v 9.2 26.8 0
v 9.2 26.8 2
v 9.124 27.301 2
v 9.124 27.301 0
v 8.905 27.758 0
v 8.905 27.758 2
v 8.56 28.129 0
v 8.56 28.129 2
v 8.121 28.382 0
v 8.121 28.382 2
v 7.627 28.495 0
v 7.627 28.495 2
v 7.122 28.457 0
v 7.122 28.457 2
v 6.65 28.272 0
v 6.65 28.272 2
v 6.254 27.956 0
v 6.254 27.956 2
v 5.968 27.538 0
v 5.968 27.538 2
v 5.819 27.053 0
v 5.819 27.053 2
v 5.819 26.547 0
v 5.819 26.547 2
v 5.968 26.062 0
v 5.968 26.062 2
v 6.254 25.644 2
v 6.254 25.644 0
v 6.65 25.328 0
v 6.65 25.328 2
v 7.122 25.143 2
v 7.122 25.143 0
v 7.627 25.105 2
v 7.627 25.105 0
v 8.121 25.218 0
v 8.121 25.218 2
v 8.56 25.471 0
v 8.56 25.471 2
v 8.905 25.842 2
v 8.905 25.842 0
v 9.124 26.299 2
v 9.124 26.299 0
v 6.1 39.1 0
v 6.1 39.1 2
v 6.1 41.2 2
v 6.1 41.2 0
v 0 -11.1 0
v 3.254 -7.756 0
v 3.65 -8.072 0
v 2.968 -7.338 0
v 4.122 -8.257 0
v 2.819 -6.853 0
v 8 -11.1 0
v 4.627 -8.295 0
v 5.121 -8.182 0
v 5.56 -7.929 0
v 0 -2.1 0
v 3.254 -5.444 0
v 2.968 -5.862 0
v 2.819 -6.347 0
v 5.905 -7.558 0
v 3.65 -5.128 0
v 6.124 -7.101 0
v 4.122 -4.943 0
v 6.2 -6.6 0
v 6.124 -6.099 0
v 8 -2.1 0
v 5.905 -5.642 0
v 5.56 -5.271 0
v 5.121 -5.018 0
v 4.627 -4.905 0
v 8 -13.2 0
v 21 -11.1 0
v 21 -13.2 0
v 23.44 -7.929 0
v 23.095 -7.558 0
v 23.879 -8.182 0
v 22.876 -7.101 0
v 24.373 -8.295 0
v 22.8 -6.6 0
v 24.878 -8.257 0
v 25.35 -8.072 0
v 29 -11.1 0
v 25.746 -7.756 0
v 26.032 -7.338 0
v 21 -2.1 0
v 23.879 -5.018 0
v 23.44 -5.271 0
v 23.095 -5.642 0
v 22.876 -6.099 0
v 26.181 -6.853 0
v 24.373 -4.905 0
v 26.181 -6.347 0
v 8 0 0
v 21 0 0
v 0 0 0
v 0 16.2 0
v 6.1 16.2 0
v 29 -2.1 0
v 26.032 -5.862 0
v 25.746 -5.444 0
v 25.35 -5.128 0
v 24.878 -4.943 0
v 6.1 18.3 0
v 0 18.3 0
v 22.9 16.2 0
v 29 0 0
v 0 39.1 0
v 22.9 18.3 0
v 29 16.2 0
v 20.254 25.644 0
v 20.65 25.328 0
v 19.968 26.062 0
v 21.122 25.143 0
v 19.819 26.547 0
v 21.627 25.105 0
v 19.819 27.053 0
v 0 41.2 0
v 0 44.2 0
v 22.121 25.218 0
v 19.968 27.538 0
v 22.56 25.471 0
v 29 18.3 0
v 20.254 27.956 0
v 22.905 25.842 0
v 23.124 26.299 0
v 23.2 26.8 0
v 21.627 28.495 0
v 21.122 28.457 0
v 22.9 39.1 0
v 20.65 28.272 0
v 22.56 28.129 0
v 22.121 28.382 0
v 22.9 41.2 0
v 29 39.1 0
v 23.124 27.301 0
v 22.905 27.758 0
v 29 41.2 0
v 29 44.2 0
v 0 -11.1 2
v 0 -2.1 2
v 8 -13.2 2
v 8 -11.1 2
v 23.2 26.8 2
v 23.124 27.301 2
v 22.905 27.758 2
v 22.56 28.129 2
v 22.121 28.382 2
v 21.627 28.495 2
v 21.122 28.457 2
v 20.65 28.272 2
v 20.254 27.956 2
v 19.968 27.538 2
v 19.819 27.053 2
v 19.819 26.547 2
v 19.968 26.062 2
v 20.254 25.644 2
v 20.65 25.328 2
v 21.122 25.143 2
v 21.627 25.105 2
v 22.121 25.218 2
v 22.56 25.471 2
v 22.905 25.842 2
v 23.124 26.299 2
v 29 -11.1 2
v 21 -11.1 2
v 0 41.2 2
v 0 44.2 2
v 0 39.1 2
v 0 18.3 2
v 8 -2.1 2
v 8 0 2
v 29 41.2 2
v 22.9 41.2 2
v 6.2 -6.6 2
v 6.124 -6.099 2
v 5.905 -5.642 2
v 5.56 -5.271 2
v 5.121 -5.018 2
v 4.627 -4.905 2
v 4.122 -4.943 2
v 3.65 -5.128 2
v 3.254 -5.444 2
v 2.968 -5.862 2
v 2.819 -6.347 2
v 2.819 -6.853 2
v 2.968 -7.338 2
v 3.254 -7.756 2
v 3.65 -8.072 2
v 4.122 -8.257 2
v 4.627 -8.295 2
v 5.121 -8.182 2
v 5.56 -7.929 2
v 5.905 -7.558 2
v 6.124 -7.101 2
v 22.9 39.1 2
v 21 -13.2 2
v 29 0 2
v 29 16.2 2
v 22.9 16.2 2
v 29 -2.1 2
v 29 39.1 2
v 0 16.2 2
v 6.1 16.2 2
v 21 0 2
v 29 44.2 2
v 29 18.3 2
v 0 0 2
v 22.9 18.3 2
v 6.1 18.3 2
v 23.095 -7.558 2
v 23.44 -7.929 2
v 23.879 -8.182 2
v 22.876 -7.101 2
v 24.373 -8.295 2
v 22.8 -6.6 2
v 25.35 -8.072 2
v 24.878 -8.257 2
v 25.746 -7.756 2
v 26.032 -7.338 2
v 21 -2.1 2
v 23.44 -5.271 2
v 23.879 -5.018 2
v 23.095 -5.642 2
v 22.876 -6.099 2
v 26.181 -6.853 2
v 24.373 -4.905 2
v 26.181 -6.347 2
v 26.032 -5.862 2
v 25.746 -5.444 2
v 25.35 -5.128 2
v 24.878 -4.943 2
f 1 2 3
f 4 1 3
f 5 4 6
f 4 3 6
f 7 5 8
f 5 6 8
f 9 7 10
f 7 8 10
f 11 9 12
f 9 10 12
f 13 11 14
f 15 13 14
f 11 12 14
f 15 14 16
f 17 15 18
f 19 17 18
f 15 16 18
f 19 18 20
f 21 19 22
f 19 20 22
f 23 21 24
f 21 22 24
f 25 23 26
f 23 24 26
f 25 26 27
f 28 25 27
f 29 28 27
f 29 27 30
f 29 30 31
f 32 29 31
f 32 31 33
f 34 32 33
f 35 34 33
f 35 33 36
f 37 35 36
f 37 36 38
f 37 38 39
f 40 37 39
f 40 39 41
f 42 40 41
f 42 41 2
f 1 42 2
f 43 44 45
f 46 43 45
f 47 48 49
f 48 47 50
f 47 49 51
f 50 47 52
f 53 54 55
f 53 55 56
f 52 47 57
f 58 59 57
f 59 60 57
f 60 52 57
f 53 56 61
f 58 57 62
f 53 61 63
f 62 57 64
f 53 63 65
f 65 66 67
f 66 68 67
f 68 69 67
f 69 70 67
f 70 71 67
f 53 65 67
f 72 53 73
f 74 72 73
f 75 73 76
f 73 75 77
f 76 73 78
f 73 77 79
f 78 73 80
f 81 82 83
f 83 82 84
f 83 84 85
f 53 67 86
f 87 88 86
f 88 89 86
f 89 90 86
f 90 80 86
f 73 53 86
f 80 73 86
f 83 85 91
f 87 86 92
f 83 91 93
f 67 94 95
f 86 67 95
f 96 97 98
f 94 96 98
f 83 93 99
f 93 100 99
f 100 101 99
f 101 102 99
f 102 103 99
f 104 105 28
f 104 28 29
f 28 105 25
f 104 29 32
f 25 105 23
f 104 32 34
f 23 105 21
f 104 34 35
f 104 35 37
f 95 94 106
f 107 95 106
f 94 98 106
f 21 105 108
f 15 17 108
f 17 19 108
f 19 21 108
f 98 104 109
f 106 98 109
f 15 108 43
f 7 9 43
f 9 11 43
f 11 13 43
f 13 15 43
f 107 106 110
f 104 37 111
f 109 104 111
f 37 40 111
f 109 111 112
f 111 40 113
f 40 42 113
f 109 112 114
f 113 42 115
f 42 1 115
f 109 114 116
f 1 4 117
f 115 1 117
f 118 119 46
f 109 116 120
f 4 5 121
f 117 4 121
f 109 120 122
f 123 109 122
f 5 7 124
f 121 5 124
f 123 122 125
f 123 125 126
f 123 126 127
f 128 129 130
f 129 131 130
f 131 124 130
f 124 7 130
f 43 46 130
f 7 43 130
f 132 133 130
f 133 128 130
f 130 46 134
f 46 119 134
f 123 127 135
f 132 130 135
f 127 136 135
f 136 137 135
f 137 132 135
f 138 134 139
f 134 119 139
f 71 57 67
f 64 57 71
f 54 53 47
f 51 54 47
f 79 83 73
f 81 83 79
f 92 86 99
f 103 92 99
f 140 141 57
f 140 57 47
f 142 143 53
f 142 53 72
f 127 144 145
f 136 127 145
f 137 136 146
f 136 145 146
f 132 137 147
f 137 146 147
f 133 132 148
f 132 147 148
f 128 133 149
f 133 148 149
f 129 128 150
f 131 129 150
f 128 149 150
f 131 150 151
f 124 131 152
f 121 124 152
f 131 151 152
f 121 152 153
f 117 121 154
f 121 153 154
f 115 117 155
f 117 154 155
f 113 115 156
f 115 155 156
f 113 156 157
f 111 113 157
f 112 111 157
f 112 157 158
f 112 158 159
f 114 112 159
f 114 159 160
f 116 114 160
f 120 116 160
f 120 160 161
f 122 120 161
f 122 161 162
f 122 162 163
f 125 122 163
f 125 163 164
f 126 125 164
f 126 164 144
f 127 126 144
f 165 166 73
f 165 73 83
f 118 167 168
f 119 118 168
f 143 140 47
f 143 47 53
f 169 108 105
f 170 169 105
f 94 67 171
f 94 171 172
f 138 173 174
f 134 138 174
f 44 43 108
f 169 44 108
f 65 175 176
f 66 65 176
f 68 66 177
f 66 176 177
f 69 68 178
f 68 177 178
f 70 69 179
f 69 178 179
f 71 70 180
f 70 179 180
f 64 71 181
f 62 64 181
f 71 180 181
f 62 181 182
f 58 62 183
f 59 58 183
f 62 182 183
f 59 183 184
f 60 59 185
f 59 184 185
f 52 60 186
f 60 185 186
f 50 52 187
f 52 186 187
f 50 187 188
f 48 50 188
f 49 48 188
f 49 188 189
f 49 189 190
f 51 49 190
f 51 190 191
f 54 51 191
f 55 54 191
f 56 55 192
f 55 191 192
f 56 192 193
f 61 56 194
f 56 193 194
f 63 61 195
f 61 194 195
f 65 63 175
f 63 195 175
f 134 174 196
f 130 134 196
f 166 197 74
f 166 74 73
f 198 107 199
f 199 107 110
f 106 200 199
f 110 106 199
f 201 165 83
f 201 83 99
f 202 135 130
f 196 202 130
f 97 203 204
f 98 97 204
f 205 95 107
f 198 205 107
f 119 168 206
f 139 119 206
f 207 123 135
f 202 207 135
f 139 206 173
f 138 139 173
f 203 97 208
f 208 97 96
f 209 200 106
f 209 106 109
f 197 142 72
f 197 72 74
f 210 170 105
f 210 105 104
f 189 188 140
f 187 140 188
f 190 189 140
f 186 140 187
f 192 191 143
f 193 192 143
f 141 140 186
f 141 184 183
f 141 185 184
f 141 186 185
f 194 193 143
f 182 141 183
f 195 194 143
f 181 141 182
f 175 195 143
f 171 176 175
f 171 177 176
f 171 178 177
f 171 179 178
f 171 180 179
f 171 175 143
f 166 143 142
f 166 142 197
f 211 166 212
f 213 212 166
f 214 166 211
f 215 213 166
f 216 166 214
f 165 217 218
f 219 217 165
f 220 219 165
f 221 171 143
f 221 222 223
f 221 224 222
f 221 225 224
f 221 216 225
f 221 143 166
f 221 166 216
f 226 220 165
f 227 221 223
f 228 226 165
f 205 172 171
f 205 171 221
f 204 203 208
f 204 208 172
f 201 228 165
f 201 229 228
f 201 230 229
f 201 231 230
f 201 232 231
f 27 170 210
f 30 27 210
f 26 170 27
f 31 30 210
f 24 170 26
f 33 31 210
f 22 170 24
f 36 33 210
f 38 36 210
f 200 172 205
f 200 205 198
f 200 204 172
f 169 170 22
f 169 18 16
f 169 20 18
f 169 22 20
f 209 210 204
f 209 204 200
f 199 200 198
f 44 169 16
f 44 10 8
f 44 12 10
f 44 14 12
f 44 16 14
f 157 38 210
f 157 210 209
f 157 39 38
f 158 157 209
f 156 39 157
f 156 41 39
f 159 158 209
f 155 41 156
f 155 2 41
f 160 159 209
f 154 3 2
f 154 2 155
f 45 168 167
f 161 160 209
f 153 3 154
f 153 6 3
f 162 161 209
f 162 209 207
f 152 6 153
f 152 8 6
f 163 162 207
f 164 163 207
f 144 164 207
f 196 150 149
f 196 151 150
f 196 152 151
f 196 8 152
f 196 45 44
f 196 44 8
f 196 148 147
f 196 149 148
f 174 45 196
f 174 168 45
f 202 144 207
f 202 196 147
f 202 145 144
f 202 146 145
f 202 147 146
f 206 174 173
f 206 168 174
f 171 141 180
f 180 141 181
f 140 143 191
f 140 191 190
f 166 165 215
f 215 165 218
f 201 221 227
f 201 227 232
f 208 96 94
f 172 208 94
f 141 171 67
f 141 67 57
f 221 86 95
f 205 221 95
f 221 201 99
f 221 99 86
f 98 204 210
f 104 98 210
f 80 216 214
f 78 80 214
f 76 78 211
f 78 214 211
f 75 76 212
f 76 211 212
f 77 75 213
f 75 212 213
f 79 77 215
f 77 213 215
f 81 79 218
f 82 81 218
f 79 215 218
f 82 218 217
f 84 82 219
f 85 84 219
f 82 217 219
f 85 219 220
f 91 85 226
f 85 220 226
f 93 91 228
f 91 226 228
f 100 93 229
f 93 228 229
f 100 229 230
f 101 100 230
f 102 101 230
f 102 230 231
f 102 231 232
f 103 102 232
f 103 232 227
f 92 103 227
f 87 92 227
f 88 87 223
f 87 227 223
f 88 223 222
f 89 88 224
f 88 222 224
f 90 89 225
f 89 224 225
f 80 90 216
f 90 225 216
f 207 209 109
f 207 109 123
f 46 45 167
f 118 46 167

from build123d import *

# Parameters (mm, degrees)
SKETCH_1_W          = 13
SKETCH_1_H          = 2.1
SKETCH_1_W_2        = 8
EXTRUDE_3_DEPTH     = 2
SKETCH_2_W          = 6.1
SKETCH_2_H          = 2.1
CUT_EXTRUDE_1_DEPTH = 2
SKETCH_12_W         = 13
SKETCH_12_H         = 2.1
EXTRUDE_9_DEPTH     = 2
SKETCH_13_R         = 1.7
EXTRUDE_10_DEPTH    = 2
SKETCH_3_W          = 16.8
SKETCH_3_H          = 2.1
EXTRUDE_4_DEPTH     = 2
SKETCH_8_R          = 1.7
CUT_EXTRUDE_4_DEPTH = 10
SKETCH_9_W          = 16.8
SKETCH_9_H          = 2.1
CUT_EXTRUDE_5_DEPTH = 10
EXTRUDE_11_DEPTH    = 2


with BuildPart() as part:
    # 草图1 → 凸台-拉伸3 (new body)
    with BuildSketch(Plane.XY):
        Polygon((0, 39.1), (0, 11.1), (8, 11.1), (21, 11.1), (29, 11.1), (29, 39.1), align=None)
        with Locations((14.5, -1.05)):
            Rectangle(SKETCH_1_W, SKETCH_1_H)
        Polygon((0, 9), (0, 0), (8, 0), (21, 0), (29, 0), (29, 9), (21, 9), (8, 9), align=None)
        with Locations((25, 10.05)):
            Rectangle(SKETCH_1_W_2, SKETCH_1_H)
        with Locations((4, 10.05)):
            Rectangle(SKETCH_1_W_2, SKETCH_1_H)
    extrude(amount=EXTRUDE_3_DEPTH)

    # 草图2 → 切除-拉伸1 (cut)
    with BuildSketch(Plane.XY.offset(2)):
        with Locations((3.05, 17.25)):
            Rectangle(SKETCH_2_W, SKETCH_2_H)
        with Locations((25.95, 17.25)):
            Rectangle(SKETCH_2_W, SKETCH_2_H)
    extrude(amount=-CUT_EXTRUDE_1_DEPTH, mode=Mode.SUBTRACT)

    # 草图12 → 凸台-拉伸9 (add)
    with BuildSketch(Plane.XY.offset(2)):
        with Locations((14.5, 10.05)):
            Rectangle(SKETCH_12_W, SKETCH_12_H)
    extrude(amount=-EXTRUDE_9_DEPTH)

    # 草图13 → 凸台-拉伸10 (add)
    with BuildSketch(Plane.XY.offset(2)):
        Polygon((8, -2.1), (0, -2.1), (0, -11.1), (8, -11.1), (8, -13.2), (21, -13.2), (21, -11.1), (29, -11.1), (29, -2.1), (21, -2.1), align=None)
        with Locations((4.5, -6.6)):
            Circle(SKETCH_13_R, mode=Mode.SUBTRACT)
        with Locations(Location((24.5, -6.6, 0), (0, 0, 180))):
            Circle(SKETCH_13_R, mode=Mode.SUBTRACT)
    extrude(amount=-EXTRUDE_10_DEPTH)

    # 草图3 → 凸台-拉伸4 (add)
    with BuildSketch(Plane.XY.offset(2)):
        with Locations((14.5, 40.15)):
            Rectangle(SKETCH_3_W, SKETCH_3_H)
    extrude(amount=-EXTRUDE_4_DEPTH)

    # 草图8 → 切除-拉伸4 (cut)
    with BuildSketch(Plane.XY.offset(2)):
        with Locations((21.5, 26.8)):
            Circle(SKETCH_8_R)
        with Locations((7.5, 26.8)):
            Circle(SKETCH_8_R)
    extrude(amount=-CUT_EXTRUDE_4_DEPTH, mode=Mode.SUBTRACT)

    # 草图9 → 切除-拉伸5 (cut)
    with BuildSketch(Plane.XY.offset(2)):
        with Locations((14.5, 40.15)):
            Rectangle(SKETCH_9_W, SKETCH_9_H)
    extrude(amount=-CUT_EXTRUDE_5_DEPTH, mode=Mode.SUBTRACT)

    # 草图11 → 凸台-拉伸11 (add)
    with BuildSketch(Plane.XY.offset(2)):
        Polygon((6.1, 39.1), (6.1, 41.2), (0, 41.2), (0, 44.2), (29, 44.2), (29, 41.2), (22.9, 41.2), (22.9, 39.1), align=None)
    extrude(amount=-EXTRUDE_11_DEPTH)


solid = part.part
